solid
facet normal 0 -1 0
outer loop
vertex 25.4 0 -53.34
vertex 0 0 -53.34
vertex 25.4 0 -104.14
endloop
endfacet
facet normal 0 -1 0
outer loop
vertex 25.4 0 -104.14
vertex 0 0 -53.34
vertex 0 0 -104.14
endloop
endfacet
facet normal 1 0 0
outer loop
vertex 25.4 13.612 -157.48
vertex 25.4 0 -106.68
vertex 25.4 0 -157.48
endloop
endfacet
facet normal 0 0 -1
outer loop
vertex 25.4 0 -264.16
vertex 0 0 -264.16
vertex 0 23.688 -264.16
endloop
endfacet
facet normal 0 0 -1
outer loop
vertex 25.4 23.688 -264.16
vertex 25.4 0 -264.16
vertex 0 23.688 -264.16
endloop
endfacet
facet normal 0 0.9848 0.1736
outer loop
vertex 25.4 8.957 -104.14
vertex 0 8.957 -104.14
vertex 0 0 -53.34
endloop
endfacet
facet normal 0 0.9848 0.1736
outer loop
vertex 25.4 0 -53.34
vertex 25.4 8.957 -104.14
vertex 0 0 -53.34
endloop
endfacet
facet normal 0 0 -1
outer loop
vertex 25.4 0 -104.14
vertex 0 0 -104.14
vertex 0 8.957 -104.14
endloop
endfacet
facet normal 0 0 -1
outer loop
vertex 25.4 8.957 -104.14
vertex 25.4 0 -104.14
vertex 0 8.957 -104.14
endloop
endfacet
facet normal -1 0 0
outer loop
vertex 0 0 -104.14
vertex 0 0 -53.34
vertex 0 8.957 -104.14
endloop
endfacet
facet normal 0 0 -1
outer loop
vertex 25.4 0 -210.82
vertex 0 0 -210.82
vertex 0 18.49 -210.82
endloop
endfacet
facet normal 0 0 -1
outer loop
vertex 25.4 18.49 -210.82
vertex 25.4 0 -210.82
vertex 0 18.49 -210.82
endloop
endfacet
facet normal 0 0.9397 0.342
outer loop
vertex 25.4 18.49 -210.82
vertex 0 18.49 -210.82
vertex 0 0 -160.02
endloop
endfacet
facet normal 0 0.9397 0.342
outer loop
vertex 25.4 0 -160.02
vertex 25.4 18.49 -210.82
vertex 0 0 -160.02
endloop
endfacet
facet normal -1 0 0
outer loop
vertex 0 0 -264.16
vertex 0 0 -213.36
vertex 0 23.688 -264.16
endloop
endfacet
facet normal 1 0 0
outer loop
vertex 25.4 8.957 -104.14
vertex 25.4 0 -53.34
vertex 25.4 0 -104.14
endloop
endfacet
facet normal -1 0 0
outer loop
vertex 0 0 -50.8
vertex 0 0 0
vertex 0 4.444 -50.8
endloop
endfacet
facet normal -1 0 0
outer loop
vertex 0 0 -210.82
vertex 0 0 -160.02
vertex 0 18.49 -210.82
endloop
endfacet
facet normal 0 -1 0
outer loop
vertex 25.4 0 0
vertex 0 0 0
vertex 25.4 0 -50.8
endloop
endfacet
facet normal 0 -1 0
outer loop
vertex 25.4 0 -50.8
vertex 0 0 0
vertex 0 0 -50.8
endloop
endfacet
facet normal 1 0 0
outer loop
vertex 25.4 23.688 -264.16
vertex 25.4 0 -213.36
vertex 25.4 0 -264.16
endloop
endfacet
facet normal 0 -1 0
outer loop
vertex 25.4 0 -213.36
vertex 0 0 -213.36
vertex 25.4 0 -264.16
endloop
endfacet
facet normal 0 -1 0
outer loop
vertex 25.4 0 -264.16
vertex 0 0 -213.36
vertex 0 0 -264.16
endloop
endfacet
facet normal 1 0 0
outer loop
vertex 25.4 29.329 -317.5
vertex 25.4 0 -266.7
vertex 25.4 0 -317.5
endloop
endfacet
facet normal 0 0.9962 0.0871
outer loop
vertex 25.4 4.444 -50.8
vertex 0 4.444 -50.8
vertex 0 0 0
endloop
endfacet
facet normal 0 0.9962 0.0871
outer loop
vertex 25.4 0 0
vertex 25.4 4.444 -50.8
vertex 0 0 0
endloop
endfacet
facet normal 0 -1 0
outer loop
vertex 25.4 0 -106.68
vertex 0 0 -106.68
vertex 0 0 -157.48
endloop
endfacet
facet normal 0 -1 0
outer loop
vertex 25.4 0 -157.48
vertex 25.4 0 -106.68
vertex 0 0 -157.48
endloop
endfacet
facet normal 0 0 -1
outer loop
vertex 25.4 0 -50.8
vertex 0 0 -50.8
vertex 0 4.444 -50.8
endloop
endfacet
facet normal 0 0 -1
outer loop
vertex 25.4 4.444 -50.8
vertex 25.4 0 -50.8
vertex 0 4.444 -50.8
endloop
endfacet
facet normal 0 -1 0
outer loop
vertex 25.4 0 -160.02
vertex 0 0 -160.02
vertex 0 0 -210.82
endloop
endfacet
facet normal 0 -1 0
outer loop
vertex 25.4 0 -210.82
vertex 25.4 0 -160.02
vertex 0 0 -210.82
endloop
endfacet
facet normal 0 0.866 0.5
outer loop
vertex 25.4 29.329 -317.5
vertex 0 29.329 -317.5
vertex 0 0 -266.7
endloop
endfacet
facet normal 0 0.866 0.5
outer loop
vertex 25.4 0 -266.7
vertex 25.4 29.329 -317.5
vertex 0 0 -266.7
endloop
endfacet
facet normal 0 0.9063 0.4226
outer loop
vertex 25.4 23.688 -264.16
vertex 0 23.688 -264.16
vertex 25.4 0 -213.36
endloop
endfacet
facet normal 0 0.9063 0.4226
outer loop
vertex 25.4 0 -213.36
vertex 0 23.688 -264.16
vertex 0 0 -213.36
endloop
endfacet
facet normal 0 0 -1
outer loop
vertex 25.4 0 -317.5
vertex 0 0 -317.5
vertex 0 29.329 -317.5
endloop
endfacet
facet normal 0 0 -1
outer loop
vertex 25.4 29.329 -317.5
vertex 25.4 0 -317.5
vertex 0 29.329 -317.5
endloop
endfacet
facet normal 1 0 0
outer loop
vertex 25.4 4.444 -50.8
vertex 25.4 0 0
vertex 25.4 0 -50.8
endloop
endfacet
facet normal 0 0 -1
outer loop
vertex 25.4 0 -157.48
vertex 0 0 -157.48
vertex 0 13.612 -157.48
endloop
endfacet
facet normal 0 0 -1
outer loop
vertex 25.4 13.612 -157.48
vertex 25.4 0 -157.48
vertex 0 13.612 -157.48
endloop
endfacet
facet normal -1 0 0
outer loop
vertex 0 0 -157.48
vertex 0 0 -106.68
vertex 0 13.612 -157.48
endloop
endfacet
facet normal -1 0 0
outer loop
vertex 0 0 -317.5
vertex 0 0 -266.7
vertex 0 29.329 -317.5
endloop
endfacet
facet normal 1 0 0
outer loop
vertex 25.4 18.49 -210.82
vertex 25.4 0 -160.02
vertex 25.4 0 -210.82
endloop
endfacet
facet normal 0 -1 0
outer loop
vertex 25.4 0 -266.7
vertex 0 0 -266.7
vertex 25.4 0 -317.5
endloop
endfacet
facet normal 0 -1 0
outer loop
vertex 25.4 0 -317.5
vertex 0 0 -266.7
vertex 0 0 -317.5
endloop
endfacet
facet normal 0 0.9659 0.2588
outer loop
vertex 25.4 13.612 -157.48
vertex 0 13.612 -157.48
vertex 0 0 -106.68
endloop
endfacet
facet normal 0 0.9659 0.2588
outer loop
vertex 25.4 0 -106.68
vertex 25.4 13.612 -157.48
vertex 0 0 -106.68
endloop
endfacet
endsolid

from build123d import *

# Parameters (mm, degrees)
BOSS_EXTRUDE1_DEPTH   = 25.4
BOSS_EXTRUDE1_2_DEPTH = 25.4
BOSS_EXTRUDE1_3_DEPTH = 25.4
BOSS_EXTRUDE1_4_DEPTH = 25.4
BOSS_EXTRUDE1_5_DEPTH = 25.4
BOSS_EXTRUDE1_6_DEPTH = 25.4


with BuildPart() as part:
    # Sketch1 → Boss-Extrude1 (new body)
    with BuildSketch(Plane(origin=(0, 0, 0), x_dir=(0, 0, -1), z_dir=(1, 0, 0))):
        Polygon((0, 0), (50.8, 0), (50.8, 4.444424107), align=None)
    extrude(amount=BOSS_EXTRUDE1_DEPTH)


with BuildPart() as body_2:
    # Sketch1 → Boss-Extrude1 2 (new body)
    with BuildSketch(Plane(origin=(0, 0, 0), x_dir=(0, 0, -1), z_dir=(1, 0, 0))):
        Polygon((53.34, 0), (104.14, 0), (104.14, 8.95741062), align=None)
    extrude(amount=BOSS_EXTRUDE1_2_DEPTH)


with BuildPart() as body_3:
    # Sketch1 → Boss-Extrude1 3 (new body)
    with BuildSketch(Plane(origin=(0, 0, 0), x_dir=(0, 0, -1), z_dir=(1, 0, 0))):
        Polygon((106.68, 0), (157.48, 0), (157.48, 13.611818976), align=None)
    extrude(amount=BOSS_EXTRUDE1_3_DEPTH)


with BuildPart() as body_4:
    # Sketch1 → Boss-Extrude1 4 (new body)
    with BuildSketch(Plane(origin=(0, 0, 0), x_dir=(0, 0, -1), z_dir=(1, 0, 0))):
        Polygon((160.02, 0), (210.82, 0), (210.82, 18.489687901), align=None)
    extrude(amount=BOSS_EXTRUDE1_4_DEPTH)


with BuildPart() as body_5:
    # Sketch1 → Boss-Extrude1 5 (new body)
    with BuildSketch(Plane(origin=(0, 0, 0), x_dir=(0, 0, -1), z_dir=(1, 0, 0))):
        Polygon((213.36, 0), (264.16, 0), (264.16, 23.688429034), align=None)
    extrude(amount=BOSS_EXTRUDE1_5_DEPTH)


with BuildPart() as body_6:
    # Sketch1 → Boss-Extrude1 6 (new body)
    with BuildSketch(Plane(origin=(0, 0, 0), x_dir=(0, 0, -1), z_dir=(1, 0, 0))):
        Polygon((266.7, 0), (317.5, 0), (317.5, 29.329393675), align=None)
    extrude(amount=BOSS_EXTRUDE1_6_DEPTH)


solid = Compound([part.part, body_2.part, body_3.part, body_4.part, body_5.part, body_6.part])
